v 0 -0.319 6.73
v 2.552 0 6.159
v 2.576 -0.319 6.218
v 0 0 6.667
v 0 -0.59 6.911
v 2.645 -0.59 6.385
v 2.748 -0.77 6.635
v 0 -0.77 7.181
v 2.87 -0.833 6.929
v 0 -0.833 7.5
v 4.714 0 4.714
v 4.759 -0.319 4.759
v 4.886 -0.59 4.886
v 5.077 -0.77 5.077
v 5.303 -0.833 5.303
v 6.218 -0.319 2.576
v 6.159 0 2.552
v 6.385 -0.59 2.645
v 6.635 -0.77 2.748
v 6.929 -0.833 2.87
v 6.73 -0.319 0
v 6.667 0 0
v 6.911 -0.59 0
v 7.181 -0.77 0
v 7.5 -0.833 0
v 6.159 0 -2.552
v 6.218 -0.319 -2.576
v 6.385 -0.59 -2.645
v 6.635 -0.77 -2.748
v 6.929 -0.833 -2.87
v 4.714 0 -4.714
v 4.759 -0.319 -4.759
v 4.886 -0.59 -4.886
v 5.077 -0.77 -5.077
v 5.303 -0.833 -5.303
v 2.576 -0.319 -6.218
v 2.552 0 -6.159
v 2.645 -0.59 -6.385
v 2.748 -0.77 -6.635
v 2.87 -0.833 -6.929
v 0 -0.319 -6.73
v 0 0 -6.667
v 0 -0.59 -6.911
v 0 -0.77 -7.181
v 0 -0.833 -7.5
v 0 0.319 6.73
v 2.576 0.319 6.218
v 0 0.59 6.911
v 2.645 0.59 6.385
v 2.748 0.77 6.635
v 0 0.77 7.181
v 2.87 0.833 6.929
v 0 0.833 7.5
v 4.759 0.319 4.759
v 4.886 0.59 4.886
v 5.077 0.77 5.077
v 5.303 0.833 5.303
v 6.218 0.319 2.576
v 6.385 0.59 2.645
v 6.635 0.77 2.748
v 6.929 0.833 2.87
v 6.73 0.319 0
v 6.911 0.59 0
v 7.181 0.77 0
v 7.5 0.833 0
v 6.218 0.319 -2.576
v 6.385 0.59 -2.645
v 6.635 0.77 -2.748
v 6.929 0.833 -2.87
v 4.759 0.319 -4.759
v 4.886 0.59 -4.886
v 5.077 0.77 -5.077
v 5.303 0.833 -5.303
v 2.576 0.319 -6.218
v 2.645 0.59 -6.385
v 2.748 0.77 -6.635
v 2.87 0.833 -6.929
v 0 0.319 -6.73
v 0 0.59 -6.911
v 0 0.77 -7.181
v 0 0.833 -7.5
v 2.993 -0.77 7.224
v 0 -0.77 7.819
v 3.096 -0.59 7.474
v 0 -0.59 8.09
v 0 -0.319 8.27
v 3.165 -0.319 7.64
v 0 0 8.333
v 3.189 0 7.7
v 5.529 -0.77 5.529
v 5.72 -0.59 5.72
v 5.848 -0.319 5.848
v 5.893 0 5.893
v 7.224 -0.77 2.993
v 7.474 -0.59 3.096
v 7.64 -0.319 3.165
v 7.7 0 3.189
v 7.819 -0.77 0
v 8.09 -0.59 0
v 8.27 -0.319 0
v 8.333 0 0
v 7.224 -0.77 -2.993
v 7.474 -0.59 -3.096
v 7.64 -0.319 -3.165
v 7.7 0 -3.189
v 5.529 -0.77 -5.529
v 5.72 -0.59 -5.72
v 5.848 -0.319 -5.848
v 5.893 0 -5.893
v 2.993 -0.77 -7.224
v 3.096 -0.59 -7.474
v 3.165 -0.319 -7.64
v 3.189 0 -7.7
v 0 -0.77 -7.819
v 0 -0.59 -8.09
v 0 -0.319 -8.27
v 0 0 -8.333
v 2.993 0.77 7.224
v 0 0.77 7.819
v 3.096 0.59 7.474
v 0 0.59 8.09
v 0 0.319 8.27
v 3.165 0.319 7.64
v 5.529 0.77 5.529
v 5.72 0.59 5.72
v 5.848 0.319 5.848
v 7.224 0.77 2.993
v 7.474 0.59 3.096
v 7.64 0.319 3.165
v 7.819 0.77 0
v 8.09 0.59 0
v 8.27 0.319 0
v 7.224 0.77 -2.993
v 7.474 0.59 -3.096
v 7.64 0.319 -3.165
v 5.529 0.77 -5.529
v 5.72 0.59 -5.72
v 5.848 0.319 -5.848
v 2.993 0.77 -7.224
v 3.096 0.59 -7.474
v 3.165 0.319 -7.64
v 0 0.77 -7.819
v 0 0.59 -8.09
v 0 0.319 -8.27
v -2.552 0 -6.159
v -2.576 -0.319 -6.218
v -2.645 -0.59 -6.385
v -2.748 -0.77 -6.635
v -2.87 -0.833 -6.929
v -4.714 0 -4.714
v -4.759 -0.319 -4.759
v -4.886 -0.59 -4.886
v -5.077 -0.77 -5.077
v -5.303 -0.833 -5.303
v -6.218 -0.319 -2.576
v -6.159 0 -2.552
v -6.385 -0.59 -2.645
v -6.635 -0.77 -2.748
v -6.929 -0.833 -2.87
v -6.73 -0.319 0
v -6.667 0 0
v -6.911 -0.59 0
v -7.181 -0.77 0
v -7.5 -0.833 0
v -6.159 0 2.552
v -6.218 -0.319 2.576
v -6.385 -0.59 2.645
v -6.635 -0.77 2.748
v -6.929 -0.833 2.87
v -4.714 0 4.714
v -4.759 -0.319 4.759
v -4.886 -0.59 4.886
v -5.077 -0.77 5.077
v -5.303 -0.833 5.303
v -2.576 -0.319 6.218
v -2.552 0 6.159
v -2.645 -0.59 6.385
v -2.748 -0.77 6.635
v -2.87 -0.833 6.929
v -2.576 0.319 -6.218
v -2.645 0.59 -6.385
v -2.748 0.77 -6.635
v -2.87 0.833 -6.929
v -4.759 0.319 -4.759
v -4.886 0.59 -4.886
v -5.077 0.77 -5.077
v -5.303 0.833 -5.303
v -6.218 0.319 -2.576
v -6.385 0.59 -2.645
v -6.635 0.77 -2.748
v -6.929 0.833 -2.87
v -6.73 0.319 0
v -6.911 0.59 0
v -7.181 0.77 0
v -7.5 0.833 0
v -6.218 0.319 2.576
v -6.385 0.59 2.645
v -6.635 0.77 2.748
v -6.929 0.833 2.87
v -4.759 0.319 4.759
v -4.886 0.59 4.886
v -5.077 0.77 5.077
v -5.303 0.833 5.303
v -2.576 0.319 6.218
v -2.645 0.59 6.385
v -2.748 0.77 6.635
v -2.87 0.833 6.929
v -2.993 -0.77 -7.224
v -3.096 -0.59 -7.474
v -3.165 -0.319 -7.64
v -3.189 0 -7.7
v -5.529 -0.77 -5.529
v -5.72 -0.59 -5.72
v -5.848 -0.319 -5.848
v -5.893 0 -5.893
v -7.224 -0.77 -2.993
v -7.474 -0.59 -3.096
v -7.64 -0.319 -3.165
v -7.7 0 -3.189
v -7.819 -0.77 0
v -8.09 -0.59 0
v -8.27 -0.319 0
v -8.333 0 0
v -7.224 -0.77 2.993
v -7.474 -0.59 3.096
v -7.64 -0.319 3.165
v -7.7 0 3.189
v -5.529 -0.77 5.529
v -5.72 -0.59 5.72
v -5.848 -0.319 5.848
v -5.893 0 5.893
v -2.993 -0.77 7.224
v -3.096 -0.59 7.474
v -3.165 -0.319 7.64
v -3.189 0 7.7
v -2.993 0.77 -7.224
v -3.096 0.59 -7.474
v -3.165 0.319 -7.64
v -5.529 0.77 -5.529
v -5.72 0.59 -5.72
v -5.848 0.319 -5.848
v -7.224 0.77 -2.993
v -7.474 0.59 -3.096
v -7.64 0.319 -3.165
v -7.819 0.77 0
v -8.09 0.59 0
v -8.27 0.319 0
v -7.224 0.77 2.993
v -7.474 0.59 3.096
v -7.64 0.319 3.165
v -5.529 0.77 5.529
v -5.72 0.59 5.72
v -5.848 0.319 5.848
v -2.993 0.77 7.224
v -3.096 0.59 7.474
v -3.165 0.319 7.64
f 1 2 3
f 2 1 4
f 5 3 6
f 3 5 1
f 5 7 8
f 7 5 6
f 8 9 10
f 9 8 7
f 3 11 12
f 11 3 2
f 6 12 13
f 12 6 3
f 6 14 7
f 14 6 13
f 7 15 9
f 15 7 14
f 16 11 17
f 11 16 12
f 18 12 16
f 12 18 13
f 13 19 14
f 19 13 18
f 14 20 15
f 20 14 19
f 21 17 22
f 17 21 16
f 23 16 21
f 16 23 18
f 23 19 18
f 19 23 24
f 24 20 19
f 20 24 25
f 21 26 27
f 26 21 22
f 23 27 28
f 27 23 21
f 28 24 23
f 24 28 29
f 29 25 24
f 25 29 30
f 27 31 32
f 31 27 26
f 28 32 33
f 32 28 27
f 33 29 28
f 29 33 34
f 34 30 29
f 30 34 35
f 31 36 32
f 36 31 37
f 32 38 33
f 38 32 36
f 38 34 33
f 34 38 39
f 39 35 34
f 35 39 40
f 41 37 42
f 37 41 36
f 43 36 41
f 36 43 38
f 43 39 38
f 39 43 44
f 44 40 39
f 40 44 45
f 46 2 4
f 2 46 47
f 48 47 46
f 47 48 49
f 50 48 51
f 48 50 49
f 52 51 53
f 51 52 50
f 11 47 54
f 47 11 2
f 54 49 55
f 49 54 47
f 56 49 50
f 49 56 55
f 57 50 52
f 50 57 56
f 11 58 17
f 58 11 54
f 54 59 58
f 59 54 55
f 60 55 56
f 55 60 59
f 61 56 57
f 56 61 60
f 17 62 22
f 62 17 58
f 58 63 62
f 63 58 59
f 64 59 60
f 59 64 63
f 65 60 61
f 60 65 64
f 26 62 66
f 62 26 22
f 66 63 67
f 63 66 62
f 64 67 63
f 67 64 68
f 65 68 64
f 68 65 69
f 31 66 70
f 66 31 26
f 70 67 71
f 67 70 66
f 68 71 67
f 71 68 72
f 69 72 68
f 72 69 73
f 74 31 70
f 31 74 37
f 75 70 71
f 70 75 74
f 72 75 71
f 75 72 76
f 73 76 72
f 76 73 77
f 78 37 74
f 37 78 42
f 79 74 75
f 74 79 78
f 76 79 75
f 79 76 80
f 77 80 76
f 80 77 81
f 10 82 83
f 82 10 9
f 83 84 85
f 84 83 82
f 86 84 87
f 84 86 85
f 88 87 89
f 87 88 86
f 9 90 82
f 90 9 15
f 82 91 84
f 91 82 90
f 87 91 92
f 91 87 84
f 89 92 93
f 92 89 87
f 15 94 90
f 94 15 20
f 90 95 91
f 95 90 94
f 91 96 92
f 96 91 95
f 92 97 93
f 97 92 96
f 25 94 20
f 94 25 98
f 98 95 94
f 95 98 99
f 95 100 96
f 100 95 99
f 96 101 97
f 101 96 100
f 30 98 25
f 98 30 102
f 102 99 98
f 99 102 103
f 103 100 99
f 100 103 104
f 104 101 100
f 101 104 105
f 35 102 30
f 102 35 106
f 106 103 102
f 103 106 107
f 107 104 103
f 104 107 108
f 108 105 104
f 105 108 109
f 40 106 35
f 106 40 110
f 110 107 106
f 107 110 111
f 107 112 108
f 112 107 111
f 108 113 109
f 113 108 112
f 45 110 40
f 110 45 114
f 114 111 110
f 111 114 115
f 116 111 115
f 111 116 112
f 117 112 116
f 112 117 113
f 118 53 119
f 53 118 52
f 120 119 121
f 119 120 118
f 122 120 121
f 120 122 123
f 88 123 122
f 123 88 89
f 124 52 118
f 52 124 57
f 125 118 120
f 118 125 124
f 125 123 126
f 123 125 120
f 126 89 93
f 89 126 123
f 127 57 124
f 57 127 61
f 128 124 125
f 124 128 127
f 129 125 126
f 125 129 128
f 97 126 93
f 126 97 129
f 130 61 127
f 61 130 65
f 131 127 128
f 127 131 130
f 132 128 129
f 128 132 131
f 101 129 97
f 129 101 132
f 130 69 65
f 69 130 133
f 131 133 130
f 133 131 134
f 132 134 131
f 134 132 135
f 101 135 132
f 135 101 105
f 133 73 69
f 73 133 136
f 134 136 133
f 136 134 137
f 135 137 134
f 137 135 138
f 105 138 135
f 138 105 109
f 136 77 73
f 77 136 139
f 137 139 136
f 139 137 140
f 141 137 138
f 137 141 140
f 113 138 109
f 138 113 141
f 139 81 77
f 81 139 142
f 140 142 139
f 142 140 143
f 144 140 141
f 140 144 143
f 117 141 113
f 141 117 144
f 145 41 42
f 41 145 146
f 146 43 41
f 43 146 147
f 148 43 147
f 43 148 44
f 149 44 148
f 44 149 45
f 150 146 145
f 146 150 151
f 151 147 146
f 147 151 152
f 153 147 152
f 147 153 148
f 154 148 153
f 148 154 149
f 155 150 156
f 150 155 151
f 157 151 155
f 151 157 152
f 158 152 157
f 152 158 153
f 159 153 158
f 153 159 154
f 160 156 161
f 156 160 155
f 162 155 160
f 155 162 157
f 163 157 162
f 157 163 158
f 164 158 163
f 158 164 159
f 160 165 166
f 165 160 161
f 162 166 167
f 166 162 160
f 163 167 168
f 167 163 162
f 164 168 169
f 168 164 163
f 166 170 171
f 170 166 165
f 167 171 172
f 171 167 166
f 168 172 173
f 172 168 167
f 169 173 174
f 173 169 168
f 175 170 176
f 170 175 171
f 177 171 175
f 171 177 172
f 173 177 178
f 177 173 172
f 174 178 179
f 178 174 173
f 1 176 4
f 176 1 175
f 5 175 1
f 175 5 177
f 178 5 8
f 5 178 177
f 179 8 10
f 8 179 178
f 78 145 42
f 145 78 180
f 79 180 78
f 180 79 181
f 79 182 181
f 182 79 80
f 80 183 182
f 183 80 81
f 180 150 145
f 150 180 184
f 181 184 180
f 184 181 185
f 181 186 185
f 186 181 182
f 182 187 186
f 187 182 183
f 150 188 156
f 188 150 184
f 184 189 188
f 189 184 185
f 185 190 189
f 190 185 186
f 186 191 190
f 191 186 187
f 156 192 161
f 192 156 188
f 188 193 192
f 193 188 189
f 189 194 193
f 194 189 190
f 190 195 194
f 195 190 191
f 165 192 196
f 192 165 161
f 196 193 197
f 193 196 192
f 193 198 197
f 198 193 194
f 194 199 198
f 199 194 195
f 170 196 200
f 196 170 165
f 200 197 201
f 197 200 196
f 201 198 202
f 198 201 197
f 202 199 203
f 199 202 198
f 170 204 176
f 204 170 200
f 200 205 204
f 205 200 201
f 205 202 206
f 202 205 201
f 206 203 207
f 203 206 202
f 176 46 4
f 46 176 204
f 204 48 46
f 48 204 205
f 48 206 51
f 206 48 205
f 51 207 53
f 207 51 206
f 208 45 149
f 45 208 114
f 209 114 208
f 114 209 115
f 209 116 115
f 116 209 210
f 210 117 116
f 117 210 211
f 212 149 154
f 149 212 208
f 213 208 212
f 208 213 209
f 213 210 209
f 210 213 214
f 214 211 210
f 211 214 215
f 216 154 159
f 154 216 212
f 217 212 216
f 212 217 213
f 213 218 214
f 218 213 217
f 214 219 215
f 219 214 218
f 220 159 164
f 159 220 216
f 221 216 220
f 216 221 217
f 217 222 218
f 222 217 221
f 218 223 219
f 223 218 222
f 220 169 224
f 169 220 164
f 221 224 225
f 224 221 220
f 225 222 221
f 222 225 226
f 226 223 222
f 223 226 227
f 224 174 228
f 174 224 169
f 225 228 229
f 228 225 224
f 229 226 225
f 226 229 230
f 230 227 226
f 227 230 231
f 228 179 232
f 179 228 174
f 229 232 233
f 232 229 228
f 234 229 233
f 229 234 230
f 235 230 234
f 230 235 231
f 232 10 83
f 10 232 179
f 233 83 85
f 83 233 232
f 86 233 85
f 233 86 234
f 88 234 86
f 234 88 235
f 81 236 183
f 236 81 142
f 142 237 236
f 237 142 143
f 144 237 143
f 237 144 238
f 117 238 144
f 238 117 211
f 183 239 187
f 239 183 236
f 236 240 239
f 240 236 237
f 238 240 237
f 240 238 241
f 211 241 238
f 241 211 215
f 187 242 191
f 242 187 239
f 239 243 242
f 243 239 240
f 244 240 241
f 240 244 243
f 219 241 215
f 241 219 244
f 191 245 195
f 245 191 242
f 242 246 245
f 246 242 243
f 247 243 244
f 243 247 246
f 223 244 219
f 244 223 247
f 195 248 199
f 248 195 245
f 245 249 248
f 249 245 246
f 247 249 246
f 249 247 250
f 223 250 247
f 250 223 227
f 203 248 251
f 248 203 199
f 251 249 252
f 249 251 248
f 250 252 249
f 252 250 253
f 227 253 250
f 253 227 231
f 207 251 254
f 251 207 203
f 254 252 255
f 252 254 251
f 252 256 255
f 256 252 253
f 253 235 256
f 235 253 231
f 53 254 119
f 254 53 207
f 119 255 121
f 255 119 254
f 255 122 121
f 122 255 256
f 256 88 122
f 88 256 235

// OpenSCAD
use <../lib.scad>
use <../p/t02i1111.scad>
use <../p/t02o1111.scad>
function ldraw_lib__85543() = [
// 0 Rubber Belt Round 15 /  1.6
// 0 Name: 85543.dat
// 0 Author: Philippe Hurbain [Philo]
// 0 !LDRAW_ORG Part UPDATE 2014-02
// 0 !LICENSE Licensed under CC BY 2.0 and CC BY 4.0 : see CAreadme.txt
// 
// 0 BFC CERTIFY CCW
  [0,"BFC","CERTIFY"],
  [0,"BFC","CCW"],
// 
// 0 !CATEGORY Technic
// 
// 0 !HISTORY 2014-12-23 [PTadmin] Official Update 2014-02
// 
// 
// 0 // Nomenclature: Rubber Belt [Round|Square] belt_diameter_(mm) / belt_thickness_(mm)
// 
// 1 16 0 0 0 0 0 18.75 -18.75 0 0 0 -18.75 0 t02i1111.dat
  [1,16,0,0,0,0,0,18.75,-18.75,0,0,0,-18.75,0, ldraw_lib__t02i1111()],
// 1 16 0 0 0 0 0 18.75 -18.75 0 0 0 18.75 0 t02i1111.dat
  [1,16,0,0,0,0,0,18.75,-18.75,0,0,0,18.75,0, ldraw_lib__t02i1111()],
// 1 16 0 0 0 0 0 18.75 -18.75 0 0 0 -18.75 0 t02o1111.dat
  [1,16,0,0,0,0,0,18.75,-18.75,0,0,0,-18.75,0, ldraw_lib__t02o1111()],
// 1 16 0 0 0 0 0 18.75 -18.75 0 0 0 18.75 0 t02o1111.dat
  [1,16,0,0,0,0,0,18.75,-18.75,0,0,0,18.75,0, ldraw_lib__t02o1111()],
// 1 16 0 0 0 0 0 -18.75 18.75 0 0 0 -18.75 0 t02i1111.dat
  [1,16,0,0,0,0,0,-18.75,18.75,0,0,0,-18.75,0, ldraw_lib__t02i1111()],
// 1 16 0 0 0 0 0 -18.75 18.75 0 0 0 18.75 0 t02i1111.dat
  [1,16,0,0,0,0,0,-18.75,18.75,0,0,0,18.75,0, ldraw_lib__t02i1111()],
// 1 16 0 0 0 0 0 -18.75 18.75 0 0 0 -18.75 0 t02o1111.dat
  [1,16,0,0,0,0,0,-18.75,18.75,0,0,0,-18.75,0, ldraw_lib__t02o1111()],
// 1 16 0 0 0 0 0 -18.75 18.75 0 0 0 18.75 0 t02o1111.dat
  [1,16,0,0,0,0,0,-18.75,18.75,0,0,0,18.75,0, ldraw_lib__t02o1111()],
];
makepoly(ldraw_lib__85543(), line=0.2);
